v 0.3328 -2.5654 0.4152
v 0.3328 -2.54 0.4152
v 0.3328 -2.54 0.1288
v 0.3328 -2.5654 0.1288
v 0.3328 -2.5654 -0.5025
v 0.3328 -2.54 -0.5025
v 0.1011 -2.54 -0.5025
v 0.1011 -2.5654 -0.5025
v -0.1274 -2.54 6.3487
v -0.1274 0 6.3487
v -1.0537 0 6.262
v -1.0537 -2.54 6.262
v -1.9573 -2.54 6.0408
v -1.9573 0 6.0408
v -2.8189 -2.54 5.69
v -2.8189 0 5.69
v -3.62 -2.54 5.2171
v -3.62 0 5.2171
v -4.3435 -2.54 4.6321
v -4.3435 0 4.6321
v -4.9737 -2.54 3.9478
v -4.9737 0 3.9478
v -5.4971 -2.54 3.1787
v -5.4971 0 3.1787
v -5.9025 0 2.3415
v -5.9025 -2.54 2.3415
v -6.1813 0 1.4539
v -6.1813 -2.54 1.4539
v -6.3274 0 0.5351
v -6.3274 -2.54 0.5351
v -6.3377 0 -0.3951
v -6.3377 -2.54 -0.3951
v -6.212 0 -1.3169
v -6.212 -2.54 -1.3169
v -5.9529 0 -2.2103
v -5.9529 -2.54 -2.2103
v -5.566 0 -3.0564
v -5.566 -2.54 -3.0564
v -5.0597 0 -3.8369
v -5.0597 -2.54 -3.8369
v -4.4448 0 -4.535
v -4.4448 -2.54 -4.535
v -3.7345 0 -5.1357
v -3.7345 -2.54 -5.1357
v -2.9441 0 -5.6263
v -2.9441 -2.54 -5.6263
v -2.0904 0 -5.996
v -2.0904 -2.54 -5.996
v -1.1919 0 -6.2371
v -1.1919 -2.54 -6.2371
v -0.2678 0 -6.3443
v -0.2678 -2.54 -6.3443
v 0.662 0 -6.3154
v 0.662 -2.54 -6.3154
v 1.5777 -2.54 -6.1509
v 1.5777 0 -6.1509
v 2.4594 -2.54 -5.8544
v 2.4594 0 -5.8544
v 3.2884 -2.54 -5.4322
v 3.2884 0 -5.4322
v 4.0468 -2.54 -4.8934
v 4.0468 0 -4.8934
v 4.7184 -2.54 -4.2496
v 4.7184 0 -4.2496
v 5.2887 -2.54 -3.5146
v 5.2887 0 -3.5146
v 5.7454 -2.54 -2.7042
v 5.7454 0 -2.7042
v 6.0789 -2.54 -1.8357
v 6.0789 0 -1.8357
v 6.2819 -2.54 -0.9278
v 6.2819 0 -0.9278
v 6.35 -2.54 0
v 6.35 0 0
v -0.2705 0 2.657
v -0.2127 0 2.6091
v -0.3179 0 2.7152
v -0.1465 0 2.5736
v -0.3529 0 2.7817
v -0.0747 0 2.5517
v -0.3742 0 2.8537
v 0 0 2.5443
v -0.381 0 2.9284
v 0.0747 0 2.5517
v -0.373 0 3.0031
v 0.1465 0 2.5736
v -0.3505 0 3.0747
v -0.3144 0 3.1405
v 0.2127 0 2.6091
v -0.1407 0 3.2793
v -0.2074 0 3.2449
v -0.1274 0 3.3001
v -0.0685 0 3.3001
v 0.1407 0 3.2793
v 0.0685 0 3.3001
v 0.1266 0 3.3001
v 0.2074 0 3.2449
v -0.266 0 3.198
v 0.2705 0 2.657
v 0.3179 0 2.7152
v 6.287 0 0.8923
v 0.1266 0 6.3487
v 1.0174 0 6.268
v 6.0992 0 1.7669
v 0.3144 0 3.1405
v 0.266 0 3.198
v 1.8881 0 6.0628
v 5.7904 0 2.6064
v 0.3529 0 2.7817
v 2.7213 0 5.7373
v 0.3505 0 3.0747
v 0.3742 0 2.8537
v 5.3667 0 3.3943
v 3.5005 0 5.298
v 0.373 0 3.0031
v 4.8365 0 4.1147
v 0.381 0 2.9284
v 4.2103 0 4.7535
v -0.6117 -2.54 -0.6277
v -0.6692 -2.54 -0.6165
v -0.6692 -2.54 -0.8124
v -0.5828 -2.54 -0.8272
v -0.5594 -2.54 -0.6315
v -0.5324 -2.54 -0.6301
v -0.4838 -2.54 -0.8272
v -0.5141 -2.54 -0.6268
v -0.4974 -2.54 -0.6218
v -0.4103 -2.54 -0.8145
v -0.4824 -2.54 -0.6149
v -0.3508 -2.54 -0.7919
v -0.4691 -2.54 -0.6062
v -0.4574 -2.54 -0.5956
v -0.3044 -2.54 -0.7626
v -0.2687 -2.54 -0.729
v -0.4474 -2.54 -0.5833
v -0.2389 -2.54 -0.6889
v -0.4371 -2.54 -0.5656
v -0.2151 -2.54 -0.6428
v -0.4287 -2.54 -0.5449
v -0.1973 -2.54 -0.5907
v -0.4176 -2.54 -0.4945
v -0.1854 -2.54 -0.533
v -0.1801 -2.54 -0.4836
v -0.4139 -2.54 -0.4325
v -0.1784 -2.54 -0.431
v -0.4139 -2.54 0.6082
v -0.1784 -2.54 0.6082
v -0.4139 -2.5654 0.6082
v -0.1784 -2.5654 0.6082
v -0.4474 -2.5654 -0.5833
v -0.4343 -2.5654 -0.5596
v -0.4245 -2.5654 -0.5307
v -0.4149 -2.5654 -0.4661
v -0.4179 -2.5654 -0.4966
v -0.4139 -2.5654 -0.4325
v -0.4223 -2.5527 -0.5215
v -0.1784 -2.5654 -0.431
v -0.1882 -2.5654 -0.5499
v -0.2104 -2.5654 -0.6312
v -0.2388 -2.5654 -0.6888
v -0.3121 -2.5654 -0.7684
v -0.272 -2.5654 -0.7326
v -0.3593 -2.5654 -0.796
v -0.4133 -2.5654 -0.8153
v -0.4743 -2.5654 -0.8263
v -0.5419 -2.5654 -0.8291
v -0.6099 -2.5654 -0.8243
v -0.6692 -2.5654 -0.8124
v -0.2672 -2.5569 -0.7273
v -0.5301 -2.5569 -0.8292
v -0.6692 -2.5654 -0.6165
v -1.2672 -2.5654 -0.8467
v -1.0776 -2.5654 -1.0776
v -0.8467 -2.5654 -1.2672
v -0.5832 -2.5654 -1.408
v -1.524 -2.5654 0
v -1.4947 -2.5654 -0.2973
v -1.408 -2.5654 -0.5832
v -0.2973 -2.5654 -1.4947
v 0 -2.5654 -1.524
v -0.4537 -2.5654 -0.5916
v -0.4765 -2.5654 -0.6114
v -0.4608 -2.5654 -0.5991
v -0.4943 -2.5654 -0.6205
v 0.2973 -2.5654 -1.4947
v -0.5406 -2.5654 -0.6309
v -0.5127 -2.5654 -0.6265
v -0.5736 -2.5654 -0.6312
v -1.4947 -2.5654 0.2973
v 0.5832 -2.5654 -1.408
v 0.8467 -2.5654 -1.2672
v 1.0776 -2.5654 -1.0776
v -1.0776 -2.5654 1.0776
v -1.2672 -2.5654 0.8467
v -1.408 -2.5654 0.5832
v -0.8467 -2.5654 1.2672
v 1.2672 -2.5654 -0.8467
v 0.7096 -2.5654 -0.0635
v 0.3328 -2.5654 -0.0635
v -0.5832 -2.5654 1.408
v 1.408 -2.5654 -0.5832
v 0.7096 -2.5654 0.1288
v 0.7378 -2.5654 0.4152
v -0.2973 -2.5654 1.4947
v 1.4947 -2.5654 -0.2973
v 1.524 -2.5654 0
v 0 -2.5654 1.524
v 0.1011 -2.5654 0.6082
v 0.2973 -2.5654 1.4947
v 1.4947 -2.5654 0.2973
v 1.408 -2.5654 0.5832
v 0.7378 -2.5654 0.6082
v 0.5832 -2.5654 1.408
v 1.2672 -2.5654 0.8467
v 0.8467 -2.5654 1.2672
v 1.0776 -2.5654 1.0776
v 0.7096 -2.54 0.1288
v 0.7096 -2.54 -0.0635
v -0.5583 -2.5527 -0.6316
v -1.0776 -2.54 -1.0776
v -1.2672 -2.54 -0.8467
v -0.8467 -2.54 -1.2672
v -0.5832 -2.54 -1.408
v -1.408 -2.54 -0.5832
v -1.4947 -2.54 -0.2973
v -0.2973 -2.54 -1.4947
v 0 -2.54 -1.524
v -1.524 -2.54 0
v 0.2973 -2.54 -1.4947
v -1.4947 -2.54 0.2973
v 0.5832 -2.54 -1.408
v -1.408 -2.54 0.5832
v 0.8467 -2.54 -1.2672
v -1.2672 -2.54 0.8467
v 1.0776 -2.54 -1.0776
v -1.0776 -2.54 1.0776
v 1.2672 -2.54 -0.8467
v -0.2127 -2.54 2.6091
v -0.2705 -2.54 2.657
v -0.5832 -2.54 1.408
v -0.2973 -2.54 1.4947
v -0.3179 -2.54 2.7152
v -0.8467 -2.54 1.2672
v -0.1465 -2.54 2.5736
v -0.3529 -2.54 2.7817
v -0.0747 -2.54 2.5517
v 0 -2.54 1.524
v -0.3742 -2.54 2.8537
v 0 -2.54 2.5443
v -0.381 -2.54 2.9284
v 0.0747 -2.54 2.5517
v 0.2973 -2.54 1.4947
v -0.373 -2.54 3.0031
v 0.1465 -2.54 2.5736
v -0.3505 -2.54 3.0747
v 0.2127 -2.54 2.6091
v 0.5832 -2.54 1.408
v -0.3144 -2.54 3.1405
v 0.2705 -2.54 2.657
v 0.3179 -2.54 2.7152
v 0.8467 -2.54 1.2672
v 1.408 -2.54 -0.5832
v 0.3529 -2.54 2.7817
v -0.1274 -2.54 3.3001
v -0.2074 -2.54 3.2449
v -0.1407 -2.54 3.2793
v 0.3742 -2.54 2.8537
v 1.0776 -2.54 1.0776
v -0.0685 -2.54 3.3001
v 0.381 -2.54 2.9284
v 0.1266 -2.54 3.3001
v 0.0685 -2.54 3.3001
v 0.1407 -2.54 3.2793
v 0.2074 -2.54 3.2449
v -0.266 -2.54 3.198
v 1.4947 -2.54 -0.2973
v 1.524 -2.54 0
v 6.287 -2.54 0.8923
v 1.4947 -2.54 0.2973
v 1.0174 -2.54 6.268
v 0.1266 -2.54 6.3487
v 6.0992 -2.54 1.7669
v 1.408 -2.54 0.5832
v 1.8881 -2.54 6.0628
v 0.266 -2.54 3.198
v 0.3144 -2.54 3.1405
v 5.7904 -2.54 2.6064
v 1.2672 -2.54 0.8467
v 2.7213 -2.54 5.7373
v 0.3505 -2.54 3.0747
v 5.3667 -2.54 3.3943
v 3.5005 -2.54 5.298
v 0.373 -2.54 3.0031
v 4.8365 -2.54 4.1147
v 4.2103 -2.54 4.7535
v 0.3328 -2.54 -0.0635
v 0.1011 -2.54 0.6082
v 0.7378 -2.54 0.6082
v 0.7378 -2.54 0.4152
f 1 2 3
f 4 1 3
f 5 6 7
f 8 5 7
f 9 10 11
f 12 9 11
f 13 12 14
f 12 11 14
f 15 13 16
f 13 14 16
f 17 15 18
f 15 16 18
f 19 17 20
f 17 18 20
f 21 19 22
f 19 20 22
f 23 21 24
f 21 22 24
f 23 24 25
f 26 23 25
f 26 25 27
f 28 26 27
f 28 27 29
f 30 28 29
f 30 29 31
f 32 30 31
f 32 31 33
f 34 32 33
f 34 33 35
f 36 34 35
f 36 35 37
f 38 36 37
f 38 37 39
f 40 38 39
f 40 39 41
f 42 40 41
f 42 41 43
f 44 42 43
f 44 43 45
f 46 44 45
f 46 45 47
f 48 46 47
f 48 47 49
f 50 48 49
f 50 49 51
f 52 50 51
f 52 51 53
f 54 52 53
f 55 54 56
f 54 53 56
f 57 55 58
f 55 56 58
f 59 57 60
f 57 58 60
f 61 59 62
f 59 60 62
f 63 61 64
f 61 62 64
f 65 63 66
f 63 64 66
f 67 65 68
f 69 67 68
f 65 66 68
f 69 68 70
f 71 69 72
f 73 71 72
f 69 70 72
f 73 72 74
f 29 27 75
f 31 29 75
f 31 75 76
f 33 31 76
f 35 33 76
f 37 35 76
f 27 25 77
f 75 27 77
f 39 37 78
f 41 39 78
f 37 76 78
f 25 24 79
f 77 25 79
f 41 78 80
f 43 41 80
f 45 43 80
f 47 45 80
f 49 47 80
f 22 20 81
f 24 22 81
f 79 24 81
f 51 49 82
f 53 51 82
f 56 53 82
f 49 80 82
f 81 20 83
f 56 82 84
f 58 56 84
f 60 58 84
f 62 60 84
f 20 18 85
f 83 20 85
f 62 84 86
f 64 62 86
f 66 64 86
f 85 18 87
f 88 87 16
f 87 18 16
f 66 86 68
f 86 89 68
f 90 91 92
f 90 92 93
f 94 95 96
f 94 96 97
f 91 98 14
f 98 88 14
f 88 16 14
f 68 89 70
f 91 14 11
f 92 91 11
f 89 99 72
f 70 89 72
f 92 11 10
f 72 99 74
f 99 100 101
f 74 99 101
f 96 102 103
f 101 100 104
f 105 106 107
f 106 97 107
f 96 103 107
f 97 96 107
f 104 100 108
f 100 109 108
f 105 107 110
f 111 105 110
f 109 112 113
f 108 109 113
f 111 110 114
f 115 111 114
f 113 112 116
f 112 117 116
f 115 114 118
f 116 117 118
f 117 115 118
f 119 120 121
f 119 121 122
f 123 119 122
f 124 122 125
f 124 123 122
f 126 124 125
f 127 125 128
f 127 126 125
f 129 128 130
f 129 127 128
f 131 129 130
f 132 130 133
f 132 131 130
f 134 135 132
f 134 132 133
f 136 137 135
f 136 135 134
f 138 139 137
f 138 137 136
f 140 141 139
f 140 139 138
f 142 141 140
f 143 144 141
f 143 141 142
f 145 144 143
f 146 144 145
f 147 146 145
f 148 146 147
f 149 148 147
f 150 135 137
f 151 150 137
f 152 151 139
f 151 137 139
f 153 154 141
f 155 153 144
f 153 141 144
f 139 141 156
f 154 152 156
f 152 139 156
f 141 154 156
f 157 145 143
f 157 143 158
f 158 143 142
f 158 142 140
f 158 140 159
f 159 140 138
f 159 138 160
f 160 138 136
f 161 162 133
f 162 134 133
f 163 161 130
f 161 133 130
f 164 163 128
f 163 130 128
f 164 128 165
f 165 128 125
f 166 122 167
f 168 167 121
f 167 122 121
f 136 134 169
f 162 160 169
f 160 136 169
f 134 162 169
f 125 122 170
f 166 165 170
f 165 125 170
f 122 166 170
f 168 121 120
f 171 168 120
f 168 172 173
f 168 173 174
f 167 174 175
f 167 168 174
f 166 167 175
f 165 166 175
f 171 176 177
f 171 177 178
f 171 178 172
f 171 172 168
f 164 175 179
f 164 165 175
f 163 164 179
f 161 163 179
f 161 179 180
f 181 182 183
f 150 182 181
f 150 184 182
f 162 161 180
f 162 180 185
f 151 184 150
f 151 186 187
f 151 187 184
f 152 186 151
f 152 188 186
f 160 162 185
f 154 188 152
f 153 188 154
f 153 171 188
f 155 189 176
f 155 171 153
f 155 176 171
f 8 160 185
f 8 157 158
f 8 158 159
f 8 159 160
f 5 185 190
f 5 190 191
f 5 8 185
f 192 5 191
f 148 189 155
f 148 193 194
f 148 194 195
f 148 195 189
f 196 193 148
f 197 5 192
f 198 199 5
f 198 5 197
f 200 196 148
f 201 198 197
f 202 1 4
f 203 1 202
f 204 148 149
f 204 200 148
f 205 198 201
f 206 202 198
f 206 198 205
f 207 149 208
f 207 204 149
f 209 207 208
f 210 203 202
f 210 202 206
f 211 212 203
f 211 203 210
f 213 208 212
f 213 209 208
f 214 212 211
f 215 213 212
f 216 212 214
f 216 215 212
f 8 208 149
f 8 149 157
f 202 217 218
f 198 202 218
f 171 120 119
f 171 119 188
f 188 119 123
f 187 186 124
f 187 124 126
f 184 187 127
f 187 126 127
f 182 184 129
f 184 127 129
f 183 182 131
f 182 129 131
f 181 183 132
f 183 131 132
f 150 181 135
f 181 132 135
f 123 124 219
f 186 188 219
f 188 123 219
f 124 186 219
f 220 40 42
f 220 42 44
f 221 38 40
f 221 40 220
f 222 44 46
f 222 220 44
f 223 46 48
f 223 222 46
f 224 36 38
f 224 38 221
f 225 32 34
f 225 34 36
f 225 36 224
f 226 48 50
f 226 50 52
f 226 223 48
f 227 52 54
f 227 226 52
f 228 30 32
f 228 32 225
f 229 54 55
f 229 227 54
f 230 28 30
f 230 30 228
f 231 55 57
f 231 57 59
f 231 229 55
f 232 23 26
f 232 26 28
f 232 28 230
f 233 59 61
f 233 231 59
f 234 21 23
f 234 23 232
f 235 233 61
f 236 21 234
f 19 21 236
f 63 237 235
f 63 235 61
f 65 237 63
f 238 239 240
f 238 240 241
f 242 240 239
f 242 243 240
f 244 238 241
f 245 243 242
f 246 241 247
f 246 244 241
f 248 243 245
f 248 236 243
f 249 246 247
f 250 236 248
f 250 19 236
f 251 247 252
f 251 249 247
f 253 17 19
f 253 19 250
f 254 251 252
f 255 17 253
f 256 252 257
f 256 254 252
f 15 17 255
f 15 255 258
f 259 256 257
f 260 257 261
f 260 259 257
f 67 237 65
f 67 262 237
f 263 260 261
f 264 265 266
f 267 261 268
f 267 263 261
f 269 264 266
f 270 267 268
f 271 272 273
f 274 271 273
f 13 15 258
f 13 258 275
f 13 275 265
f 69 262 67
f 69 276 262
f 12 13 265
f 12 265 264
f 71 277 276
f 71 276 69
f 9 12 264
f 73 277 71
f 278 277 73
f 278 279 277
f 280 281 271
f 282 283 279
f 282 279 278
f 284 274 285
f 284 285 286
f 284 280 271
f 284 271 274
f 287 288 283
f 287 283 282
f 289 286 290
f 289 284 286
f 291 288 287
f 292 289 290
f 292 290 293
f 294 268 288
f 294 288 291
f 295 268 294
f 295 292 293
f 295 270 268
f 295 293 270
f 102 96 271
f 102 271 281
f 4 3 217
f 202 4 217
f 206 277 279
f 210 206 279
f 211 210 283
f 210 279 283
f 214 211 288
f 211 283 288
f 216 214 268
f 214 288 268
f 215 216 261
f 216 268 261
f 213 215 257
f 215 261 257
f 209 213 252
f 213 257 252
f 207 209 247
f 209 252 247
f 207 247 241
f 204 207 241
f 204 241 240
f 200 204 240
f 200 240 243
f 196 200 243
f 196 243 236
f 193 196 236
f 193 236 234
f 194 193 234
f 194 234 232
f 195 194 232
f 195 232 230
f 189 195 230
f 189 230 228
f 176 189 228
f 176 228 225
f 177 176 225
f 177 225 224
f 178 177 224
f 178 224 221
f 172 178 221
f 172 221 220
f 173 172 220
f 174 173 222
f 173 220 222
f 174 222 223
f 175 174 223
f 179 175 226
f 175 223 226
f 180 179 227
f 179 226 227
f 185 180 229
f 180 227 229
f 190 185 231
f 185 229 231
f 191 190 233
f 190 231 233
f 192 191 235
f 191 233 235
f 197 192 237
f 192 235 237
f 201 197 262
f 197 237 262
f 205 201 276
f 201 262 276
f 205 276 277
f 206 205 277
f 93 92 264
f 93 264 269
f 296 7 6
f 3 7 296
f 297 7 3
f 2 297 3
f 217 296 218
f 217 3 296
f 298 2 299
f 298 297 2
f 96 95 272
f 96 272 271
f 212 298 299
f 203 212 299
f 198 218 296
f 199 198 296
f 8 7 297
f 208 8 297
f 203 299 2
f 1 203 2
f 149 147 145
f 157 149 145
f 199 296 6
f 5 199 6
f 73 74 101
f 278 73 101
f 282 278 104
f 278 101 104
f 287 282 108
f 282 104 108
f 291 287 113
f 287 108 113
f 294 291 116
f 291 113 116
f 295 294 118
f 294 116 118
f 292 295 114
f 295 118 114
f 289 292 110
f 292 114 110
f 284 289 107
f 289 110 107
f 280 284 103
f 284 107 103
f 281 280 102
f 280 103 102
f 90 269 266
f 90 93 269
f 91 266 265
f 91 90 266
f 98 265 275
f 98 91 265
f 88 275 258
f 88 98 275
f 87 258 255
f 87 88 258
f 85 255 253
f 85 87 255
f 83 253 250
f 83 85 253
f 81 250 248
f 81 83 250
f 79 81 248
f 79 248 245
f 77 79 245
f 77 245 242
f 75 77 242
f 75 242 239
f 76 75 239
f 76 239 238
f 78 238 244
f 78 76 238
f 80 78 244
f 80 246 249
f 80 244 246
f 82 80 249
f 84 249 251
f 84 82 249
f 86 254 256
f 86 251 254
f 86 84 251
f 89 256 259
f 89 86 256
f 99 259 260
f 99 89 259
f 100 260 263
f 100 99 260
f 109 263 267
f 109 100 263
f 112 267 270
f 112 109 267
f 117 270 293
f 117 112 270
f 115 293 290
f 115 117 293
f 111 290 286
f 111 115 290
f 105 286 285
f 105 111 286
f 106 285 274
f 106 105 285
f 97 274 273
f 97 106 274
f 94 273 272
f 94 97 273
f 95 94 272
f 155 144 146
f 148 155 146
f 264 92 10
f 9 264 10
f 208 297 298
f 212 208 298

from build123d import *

# Parameters (mm, degrees)
F0_R     = 6.35
F1_DEPTH = 2.54
F2_R     = 0.381
F3_DEPTH = 11.938
F4_W     = 0.254
F4_H     = 3.2643415034
F5_DEPTH = 10.7696
F6_R     = 1.524
F7_DEPTH = 2.5654


with BuildPart() as f1:
    # F0 (on Front) → F1 (new body)
    with BuildSketch(Plane.XZ):
        Circle(F0_R)
    extrude(amount=F1_DEPTH)

    # F2 (on Front) → F3 (cut)
    with BuildSketch(Plane.XZ):
        with Locations((0, 2.9252786189)):
            Circle(F2_R)
    extrude(amount=F3_DEPTH, mode=Mode.SUBTRACT)

    # F4 (on Front) → F5 (cut)
    with BuildSketch(Plane.XZ):
        with Locations((-0.0004456008, 4.9322359264)):
            Rectangle(F4_W, F4_H)
    extrude(amount=F5_DEPTH, mode=Mode.SUBTRACT)

    # F6 (on Front) → F7 (join)
    with BuildSketch(Plane.XZ):
        Circle(F6_R)
        with BuildLine():
            add(Edge.make_bspline(
                [(-0.2672408938, -0.7273242873), (-0.3560866168, -0.8291747878), (-0.5301318635, -0.8291747878)],
                knots=[0, 0, 0, 1, 1, 1], degree=2))
            add(Edge.make_bspline(
                [(-0.5301318635, -0.8291747878), (-0.6098620882, -0.8291747878), (-0.6691735969, -0.812402271)],
                knots=[0, 0, 0, 1, 1, 1], degree=2))
            Line((-0.6691735969, -0.812402271), (-0.6691735969, -0.6164798285))
            add(Edge.make_bspline(
                [(-0.6691735969, -0.6164798285), (-0.6084036085, -0.6315507856), (-0.5583291381, -0.6315507856)],
                knots=[0, 0, 0, 1, 1, 1], degree=2))
            add(Edge.make_bspline(
                [(-0.5583291381, -0.6315507856), (-0.4807866329, -0.6315507856), (-0.4473631393, -0.5832994149)],
                knots=[0, 0, 0, 1, 1, 1], degree=2))
            add(Edge.make_bspline(
                [(-0.4473631393, -0.5832994149), (-0.4139396457, -0.5350480441), (-0.4139396457, -0.4324683037)],
                knots=[0, 0, 0, 1, 1, 1], degree=2))
            Line((-0.4139396457, -0.4324683037), (-0.4139396457, 0.6081569771))
            Line((-0.4139396457, 0.6081569771), (-0.1783951708, 0.6081569771))
            Line((-0.1783951708, 0.6081569771), (-0.1783951708, -0.431009824))
            add(Edge.make_bspline(
                [(-0.1783951708, -0.431009824), (-0.1783951708, -0.6254737868), (-0.2672408938, -0.7273242873)],
                knots=[0, 0, 0, 1, 1, 1], degree=2))
        make_face(mode=Mode.SUBTRACT)
        Polygon((0.3328019713, -0.0634729344), (0.3328019713, -0.5024753303), (0.1011467757, -0.5024753303), (0.1011467757, 0.6081569771), (0.7377731738, 0.6081569771), (0.7377731738, 0.415151494), (0.3328019713, 0.415151494), (0.3328019713, 0.1288033088), (0.7095758992, 0.1288033088), (0.7095758992, -0.0634729344), align=None, mode=Mode.SUBTRACT)
    extrude(amount=F7_DEPTH)


solid = f1.part
